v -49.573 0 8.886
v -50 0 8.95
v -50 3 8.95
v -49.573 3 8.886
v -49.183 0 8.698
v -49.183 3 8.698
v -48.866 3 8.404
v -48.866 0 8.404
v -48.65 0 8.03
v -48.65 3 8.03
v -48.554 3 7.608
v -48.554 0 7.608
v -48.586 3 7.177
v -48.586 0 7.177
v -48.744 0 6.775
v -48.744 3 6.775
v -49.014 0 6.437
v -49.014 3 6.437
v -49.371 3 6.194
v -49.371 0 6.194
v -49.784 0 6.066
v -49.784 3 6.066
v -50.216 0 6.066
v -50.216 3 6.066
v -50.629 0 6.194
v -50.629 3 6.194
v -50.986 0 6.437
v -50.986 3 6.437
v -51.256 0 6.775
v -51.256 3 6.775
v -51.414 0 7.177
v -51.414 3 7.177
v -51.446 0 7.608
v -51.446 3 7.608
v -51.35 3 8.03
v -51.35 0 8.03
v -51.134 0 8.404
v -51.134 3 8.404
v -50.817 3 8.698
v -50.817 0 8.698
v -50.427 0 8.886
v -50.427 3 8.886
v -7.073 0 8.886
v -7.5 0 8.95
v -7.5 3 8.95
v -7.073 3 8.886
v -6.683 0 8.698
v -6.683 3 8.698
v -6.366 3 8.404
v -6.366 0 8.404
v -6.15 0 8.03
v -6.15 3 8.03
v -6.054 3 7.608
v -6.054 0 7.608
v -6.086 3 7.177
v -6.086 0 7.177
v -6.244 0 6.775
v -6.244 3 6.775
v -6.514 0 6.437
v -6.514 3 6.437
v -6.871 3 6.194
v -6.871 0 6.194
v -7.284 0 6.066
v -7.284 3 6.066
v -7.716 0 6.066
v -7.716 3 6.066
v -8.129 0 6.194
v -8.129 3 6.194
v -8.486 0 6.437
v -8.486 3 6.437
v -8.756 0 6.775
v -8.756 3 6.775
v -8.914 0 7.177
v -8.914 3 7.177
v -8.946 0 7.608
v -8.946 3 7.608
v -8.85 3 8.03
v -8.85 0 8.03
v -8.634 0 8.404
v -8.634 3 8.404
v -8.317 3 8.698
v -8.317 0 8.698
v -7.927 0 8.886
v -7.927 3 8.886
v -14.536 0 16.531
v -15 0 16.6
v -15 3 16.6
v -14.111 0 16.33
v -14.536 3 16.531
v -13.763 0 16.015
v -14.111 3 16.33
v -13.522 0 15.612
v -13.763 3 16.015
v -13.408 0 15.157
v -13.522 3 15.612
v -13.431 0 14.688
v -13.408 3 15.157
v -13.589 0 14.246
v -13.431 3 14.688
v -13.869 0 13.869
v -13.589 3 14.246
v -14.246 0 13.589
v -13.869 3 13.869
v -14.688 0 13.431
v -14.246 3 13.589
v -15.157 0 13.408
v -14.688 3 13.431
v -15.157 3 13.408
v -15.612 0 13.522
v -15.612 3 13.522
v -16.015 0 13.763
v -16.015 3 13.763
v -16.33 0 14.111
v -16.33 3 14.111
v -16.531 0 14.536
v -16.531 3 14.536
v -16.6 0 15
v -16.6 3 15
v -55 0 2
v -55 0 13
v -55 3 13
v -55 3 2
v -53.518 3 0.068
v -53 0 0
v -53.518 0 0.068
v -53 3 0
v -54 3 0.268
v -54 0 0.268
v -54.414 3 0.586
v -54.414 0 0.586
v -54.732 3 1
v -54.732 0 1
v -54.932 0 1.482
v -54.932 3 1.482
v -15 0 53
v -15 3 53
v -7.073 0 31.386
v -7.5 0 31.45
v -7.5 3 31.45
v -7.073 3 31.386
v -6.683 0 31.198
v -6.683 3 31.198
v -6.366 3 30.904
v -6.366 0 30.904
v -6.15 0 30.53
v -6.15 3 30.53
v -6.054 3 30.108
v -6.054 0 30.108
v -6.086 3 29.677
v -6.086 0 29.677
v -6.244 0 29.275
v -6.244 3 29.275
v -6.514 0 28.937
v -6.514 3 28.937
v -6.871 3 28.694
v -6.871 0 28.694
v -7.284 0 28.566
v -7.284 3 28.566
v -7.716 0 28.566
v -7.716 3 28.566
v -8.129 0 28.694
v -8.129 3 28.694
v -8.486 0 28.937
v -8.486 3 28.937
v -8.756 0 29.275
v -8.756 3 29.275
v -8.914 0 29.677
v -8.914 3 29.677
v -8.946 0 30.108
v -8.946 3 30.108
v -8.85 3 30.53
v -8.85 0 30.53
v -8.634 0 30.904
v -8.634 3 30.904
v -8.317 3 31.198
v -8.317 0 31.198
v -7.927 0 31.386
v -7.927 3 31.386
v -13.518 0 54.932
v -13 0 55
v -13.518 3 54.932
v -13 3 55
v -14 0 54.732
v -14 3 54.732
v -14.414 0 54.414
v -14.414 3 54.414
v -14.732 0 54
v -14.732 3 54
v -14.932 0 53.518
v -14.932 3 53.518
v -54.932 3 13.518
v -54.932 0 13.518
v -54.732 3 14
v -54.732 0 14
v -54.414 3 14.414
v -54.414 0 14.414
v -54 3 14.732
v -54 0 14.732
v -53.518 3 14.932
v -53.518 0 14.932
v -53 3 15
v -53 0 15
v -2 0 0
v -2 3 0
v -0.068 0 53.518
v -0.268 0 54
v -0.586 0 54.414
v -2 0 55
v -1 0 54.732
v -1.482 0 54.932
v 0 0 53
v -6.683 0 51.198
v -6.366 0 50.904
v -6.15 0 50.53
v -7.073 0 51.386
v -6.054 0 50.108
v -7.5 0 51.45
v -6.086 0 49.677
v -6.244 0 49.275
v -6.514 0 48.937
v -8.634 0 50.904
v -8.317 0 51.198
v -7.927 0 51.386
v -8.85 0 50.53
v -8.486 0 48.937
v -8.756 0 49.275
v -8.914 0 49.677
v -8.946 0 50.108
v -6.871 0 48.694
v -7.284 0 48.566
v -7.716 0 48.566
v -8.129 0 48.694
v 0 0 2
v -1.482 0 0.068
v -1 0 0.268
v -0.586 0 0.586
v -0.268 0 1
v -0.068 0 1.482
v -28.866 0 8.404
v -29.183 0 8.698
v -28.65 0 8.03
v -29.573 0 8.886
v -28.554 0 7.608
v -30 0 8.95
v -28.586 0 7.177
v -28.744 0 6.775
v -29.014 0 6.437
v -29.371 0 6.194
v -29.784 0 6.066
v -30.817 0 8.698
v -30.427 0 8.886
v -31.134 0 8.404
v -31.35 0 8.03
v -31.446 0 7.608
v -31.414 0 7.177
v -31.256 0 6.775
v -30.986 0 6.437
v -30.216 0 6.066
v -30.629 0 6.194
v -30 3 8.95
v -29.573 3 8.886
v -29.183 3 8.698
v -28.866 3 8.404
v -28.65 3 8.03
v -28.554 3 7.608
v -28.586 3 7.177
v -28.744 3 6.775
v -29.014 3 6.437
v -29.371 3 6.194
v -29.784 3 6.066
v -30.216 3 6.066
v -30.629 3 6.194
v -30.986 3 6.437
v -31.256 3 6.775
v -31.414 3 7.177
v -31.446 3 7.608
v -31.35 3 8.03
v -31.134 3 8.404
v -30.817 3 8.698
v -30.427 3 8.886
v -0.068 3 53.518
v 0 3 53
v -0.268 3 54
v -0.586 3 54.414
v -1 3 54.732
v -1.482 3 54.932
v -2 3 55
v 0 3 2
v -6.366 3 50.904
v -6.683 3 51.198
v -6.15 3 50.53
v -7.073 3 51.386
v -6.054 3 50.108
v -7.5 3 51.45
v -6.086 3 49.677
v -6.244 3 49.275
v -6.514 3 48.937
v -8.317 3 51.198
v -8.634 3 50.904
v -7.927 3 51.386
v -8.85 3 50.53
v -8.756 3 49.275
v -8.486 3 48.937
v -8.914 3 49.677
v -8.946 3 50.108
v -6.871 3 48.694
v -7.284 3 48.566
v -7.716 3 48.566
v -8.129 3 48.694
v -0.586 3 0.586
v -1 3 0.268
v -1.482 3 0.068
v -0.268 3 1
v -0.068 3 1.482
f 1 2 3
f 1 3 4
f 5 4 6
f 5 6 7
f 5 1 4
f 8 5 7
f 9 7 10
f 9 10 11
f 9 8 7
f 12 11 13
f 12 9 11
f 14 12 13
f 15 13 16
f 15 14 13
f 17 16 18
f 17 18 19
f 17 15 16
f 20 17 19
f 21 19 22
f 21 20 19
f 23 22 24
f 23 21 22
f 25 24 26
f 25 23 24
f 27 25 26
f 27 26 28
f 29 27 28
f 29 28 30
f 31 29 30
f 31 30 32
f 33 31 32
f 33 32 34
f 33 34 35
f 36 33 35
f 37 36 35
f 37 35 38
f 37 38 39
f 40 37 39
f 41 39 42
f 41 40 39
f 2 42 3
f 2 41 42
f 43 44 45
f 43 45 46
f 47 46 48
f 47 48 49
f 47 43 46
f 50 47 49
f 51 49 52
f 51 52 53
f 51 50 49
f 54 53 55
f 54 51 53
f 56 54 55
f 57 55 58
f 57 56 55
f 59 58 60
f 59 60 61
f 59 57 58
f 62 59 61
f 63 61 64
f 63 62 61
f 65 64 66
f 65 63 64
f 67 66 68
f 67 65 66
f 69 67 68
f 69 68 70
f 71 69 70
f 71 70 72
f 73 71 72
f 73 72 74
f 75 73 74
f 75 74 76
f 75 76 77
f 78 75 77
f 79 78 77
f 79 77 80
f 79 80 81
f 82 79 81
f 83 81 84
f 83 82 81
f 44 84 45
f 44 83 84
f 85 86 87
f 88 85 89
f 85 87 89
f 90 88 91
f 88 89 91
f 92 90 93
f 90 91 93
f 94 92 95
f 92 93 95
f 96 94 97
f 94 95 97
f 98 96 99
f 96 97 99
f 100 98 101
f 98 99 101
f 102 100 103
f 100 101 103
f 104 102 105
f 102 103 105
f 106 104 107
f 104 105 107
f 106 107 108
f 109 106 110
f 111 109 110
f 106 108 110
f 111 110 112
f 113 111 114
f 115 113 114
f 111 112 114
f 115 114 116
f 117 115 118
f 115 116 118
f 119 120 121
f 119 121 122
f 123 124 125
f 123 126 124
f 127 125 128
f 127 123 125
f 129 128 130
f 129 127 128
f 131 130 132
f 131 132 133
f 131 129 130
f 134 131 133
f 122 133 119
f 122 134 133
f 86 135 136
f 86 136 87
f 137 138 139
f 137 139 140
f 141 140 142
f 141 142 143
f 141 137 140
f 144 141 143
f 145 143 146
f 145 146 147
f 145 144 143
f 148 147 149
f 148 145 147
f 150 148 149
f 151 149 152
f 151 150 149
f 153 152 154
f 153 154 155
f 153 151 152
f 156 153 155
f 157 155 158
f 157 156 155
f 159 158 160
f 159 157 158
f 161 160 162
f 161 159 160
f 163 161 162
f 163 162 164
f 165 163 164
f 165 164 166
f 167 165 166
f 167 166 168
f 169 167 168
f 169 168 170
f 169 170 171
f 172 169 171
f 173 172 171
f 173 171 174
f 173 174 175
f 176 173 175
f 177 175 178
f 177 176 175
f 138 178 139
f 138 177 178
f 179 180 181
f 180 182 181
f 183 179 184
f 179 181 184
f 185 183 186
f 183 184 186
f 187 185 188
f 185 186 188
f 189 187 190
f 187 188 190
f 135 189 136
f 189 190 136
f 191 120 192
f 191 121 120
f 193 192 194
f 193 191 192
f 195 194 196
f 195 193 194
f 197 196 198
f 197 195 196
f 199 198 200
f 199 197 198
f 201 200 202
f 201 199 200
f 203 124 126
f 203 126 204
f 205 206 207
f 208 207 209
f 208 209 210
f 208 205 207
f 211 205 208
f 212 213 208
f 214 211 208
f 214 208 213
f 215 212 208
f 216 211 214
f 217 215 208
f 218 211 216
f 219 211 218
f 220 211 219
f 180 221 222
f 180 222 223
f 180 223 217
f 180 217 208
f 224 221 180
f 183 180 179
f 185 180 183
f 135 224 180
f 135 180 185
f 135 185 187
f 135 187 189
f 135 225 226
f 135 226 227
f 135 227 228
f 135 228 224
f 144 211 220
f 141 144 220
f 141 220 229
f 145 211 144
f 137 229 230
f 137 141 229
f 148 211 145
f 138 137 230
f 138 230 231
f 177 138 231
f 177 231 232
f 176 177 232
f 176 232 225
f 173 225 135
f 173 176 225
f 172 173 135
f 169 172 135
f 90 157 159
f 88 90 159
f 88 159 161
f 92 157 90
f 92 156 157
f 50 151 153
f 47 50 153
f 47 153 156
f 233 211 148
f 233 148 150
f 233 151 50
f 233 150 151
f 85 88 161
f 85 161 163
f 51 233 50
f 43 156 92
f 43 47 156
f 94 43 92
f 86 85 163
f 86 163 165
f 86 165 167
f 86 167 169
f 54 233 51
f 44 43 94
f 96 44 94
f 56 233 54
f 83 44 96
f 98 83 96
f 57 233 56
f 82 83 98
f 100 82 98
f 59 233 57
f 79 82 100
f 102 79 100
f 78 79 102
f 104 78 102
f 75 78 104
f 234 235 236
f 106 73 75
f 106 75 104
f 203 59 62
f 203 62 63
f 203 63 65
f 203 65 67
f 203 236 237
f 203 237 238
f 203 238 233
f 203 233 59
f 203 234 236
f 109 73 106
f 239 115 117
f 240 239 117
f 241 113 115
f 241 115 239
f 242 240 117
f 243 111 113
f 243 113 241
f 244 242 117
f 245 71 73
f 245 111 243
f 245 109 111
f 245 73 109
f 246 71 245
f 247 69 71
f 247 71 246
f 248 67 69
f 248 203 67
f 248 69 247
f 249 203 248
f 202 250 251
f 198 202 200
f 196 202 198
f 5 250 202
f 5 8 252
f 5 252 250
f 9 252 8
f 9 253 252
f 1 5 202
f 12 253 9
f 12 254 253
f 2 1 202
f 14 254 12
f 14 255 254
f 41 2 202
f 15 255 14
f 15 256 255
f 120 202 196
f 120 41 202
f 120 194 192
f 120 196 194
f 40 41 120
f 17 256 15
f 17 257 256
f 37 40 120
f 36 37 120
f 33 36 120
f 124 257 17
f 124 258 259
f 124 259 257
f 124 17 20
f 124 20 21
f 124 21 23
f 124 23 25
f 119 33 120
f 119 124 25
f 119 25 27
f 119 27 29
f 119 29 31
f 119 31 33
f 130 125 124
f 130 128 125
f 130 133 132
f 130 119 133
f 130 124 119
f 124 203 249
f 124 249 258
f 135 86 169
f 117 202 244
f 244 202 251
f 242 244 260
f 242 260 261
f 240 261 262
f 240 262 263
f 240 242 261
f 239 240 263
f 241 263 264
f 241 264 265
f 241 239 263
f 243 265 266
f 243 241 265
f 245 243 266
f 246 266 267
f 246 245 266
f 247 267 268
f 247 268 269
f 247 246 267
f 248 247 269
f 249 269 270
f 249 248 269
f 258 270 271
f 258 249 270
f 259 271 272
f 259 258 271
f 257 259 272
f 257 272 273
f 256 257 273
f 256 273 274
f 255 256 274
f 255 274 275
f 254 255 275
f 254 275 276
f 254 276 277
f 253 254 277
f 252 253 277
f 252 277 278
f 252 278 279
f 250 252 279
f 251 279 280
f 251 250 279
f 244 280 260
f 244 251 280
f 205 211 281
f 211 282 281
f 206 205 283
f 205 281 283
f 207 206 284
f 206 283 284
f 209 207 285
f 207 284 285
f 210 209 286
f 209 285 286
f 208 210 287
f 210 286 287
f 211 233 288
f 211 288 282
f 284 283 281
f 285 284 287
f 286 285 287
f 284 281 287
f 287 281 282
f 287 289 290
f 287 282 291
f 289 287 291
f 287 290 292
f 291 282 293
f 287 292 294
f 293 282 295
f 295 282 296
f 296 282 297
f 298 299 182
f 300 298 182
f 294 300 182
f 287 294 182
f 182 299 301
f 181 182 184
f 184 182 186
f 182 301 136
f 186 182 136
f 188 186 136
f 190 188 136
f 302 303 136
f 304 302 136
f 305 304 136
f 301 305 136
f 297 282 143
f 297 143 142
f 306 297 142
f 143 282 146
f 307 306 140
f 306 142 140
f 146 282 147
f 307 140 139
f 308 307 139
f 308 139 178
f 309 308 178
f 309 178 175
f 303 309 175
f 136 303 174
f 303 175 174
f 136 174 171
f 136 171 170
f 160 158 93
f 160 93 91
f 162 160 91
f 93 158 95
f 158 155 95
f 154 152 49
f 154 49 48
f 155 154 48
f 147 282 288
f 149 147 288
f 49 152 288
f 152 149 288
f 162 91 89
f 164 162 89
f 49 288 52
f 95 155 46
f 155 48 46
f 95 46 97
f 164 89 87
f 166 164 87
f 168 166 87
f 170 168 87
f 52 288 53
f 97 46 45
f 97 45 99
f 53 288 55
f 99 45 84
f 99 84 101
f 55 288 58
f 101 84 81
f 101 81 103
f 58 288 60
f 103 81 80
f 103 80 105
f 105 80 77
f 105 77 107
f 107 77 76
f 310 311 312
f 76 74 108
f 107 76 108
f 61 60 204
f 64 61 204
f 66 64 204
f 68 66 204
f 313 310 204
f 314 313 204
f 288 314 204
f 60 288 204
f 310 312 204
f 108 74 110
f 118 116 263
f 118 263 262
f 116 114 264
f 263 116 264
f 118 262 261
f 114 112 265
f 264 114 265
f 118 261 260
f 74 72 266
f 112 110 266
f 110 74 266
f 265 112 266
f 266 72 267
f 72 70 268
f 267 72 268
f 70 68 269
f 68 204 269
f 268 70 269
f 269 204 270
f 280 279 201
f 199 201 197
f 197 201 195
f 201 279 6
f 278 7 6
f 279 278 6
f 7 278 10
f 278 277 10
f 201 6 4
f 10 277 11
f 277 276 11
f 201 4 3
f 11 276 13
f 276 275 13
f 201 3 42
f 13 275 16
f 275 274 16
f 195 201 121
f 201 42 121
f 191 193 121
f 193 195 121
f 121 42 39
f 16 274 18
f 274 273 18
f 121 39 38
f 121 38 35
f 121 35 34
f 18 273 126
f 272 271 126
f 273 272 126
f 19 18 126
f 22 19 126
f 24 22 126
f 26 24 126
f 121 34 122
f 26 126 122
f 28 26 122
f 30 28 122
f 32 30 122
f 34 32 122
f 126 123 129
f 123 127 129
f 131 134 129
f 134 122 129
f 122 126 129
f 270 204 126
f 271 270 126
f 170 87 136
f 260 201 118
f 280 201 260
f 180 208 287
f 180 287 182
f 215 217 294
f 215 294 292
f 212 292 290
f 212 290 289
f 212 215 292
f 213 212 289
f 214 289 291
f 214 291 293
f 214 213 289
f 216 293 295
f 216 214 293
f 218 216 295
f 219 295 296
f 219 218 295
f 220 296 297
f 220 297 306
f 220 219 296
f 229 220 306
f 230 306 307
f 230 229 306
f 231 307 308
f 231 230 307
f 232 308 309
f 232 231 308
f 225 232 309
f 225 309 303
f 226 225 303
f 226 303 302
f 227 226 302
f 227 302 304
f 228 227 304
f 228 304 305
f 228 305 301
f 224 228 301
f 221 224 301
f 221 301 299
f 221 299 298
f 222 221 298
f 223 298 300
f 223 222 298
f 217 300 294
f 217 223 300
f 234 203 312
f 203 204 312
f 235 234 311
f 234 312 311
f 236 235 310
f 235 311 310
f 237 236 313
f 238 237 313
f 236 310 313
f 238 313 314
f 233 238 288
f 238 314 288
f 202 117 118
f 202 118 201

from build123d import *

# Parameters (mm, degrees)
SKETCH_1_R          = 1.45
EXTRUDE_1_DEPTH     = 3
FILLET_1_R          = 2
SKETCH_2_R          = 1.6
CUT_EXTRUDE_1_DEPTH = 78.839578622


with BuildPart() as part:
    # 草图1 → 凸台-拉伸1 (new body)
    with BuildSketch(Plane(origin=(0, 0, 0), x_dir=(1, 0, 0), z_dir=(0, 1, 0))):
        Polygon((-55, 0), (0, 0), (0, -55), (-15, -55), (-15, -15), (-55, -15), align=None)
        with Locations(Location((-7.5, -7.5, 0), (0, 0, 270))):
            Circle(SKETCH_1_R, mode=Mode.SUBTRACT)
        with Locations(Location((-7.5, -30, 0), (0, 0, 270))):
            Circle(SKETCH_1_R, mode=Mode.SUBTRACT)
        with Locations(Location((-7.5, -50, 0), (0, 0, 270))):
            Circle(SKETCH_1_R, mode=Mode.SUBTRACT)
        with Locations(Location((-30, -7.5, 0), (0, 0, 270))):
            Circle(SKETCH_1_R, mode=Mode.SUBTRACT)
        with Locations(Location((-50, -7.5, 0), (0, 0, 270))):
            Circle(SKETCH_1_R, mode=Mode.SUBTRACT)
    extrude(amount=EXTRUDE_1_DEPTH)

    # 圆角1
    fillet_1_edges = [part.edges().sort_by_distance(p)[0] for p in [
        (-55, 1.5, 0),
        (0, 1.5, 0),
        (0, 1.5, 55),
        (-15, 1.5, 55),
        (-55, 1.5, 15),
    ]]
    fillet(fillet_1_edges, radius=FILLET_1_R)

    # 草图2 → 切除-拉伸1 (cut, through all)
    with BuildSketch(Plane(origin=(0, 3, 0), x_dir=(1, 0, 0), z_dir=(0, 1, 0))):
        with Locations((-15, -15)):
            Circle(SKETCH_2_R)
    extrude(amount=-CUT_EXTRUDE_1_DEPTH, mode=Mode.SUBTRACT)


solid = part.part
